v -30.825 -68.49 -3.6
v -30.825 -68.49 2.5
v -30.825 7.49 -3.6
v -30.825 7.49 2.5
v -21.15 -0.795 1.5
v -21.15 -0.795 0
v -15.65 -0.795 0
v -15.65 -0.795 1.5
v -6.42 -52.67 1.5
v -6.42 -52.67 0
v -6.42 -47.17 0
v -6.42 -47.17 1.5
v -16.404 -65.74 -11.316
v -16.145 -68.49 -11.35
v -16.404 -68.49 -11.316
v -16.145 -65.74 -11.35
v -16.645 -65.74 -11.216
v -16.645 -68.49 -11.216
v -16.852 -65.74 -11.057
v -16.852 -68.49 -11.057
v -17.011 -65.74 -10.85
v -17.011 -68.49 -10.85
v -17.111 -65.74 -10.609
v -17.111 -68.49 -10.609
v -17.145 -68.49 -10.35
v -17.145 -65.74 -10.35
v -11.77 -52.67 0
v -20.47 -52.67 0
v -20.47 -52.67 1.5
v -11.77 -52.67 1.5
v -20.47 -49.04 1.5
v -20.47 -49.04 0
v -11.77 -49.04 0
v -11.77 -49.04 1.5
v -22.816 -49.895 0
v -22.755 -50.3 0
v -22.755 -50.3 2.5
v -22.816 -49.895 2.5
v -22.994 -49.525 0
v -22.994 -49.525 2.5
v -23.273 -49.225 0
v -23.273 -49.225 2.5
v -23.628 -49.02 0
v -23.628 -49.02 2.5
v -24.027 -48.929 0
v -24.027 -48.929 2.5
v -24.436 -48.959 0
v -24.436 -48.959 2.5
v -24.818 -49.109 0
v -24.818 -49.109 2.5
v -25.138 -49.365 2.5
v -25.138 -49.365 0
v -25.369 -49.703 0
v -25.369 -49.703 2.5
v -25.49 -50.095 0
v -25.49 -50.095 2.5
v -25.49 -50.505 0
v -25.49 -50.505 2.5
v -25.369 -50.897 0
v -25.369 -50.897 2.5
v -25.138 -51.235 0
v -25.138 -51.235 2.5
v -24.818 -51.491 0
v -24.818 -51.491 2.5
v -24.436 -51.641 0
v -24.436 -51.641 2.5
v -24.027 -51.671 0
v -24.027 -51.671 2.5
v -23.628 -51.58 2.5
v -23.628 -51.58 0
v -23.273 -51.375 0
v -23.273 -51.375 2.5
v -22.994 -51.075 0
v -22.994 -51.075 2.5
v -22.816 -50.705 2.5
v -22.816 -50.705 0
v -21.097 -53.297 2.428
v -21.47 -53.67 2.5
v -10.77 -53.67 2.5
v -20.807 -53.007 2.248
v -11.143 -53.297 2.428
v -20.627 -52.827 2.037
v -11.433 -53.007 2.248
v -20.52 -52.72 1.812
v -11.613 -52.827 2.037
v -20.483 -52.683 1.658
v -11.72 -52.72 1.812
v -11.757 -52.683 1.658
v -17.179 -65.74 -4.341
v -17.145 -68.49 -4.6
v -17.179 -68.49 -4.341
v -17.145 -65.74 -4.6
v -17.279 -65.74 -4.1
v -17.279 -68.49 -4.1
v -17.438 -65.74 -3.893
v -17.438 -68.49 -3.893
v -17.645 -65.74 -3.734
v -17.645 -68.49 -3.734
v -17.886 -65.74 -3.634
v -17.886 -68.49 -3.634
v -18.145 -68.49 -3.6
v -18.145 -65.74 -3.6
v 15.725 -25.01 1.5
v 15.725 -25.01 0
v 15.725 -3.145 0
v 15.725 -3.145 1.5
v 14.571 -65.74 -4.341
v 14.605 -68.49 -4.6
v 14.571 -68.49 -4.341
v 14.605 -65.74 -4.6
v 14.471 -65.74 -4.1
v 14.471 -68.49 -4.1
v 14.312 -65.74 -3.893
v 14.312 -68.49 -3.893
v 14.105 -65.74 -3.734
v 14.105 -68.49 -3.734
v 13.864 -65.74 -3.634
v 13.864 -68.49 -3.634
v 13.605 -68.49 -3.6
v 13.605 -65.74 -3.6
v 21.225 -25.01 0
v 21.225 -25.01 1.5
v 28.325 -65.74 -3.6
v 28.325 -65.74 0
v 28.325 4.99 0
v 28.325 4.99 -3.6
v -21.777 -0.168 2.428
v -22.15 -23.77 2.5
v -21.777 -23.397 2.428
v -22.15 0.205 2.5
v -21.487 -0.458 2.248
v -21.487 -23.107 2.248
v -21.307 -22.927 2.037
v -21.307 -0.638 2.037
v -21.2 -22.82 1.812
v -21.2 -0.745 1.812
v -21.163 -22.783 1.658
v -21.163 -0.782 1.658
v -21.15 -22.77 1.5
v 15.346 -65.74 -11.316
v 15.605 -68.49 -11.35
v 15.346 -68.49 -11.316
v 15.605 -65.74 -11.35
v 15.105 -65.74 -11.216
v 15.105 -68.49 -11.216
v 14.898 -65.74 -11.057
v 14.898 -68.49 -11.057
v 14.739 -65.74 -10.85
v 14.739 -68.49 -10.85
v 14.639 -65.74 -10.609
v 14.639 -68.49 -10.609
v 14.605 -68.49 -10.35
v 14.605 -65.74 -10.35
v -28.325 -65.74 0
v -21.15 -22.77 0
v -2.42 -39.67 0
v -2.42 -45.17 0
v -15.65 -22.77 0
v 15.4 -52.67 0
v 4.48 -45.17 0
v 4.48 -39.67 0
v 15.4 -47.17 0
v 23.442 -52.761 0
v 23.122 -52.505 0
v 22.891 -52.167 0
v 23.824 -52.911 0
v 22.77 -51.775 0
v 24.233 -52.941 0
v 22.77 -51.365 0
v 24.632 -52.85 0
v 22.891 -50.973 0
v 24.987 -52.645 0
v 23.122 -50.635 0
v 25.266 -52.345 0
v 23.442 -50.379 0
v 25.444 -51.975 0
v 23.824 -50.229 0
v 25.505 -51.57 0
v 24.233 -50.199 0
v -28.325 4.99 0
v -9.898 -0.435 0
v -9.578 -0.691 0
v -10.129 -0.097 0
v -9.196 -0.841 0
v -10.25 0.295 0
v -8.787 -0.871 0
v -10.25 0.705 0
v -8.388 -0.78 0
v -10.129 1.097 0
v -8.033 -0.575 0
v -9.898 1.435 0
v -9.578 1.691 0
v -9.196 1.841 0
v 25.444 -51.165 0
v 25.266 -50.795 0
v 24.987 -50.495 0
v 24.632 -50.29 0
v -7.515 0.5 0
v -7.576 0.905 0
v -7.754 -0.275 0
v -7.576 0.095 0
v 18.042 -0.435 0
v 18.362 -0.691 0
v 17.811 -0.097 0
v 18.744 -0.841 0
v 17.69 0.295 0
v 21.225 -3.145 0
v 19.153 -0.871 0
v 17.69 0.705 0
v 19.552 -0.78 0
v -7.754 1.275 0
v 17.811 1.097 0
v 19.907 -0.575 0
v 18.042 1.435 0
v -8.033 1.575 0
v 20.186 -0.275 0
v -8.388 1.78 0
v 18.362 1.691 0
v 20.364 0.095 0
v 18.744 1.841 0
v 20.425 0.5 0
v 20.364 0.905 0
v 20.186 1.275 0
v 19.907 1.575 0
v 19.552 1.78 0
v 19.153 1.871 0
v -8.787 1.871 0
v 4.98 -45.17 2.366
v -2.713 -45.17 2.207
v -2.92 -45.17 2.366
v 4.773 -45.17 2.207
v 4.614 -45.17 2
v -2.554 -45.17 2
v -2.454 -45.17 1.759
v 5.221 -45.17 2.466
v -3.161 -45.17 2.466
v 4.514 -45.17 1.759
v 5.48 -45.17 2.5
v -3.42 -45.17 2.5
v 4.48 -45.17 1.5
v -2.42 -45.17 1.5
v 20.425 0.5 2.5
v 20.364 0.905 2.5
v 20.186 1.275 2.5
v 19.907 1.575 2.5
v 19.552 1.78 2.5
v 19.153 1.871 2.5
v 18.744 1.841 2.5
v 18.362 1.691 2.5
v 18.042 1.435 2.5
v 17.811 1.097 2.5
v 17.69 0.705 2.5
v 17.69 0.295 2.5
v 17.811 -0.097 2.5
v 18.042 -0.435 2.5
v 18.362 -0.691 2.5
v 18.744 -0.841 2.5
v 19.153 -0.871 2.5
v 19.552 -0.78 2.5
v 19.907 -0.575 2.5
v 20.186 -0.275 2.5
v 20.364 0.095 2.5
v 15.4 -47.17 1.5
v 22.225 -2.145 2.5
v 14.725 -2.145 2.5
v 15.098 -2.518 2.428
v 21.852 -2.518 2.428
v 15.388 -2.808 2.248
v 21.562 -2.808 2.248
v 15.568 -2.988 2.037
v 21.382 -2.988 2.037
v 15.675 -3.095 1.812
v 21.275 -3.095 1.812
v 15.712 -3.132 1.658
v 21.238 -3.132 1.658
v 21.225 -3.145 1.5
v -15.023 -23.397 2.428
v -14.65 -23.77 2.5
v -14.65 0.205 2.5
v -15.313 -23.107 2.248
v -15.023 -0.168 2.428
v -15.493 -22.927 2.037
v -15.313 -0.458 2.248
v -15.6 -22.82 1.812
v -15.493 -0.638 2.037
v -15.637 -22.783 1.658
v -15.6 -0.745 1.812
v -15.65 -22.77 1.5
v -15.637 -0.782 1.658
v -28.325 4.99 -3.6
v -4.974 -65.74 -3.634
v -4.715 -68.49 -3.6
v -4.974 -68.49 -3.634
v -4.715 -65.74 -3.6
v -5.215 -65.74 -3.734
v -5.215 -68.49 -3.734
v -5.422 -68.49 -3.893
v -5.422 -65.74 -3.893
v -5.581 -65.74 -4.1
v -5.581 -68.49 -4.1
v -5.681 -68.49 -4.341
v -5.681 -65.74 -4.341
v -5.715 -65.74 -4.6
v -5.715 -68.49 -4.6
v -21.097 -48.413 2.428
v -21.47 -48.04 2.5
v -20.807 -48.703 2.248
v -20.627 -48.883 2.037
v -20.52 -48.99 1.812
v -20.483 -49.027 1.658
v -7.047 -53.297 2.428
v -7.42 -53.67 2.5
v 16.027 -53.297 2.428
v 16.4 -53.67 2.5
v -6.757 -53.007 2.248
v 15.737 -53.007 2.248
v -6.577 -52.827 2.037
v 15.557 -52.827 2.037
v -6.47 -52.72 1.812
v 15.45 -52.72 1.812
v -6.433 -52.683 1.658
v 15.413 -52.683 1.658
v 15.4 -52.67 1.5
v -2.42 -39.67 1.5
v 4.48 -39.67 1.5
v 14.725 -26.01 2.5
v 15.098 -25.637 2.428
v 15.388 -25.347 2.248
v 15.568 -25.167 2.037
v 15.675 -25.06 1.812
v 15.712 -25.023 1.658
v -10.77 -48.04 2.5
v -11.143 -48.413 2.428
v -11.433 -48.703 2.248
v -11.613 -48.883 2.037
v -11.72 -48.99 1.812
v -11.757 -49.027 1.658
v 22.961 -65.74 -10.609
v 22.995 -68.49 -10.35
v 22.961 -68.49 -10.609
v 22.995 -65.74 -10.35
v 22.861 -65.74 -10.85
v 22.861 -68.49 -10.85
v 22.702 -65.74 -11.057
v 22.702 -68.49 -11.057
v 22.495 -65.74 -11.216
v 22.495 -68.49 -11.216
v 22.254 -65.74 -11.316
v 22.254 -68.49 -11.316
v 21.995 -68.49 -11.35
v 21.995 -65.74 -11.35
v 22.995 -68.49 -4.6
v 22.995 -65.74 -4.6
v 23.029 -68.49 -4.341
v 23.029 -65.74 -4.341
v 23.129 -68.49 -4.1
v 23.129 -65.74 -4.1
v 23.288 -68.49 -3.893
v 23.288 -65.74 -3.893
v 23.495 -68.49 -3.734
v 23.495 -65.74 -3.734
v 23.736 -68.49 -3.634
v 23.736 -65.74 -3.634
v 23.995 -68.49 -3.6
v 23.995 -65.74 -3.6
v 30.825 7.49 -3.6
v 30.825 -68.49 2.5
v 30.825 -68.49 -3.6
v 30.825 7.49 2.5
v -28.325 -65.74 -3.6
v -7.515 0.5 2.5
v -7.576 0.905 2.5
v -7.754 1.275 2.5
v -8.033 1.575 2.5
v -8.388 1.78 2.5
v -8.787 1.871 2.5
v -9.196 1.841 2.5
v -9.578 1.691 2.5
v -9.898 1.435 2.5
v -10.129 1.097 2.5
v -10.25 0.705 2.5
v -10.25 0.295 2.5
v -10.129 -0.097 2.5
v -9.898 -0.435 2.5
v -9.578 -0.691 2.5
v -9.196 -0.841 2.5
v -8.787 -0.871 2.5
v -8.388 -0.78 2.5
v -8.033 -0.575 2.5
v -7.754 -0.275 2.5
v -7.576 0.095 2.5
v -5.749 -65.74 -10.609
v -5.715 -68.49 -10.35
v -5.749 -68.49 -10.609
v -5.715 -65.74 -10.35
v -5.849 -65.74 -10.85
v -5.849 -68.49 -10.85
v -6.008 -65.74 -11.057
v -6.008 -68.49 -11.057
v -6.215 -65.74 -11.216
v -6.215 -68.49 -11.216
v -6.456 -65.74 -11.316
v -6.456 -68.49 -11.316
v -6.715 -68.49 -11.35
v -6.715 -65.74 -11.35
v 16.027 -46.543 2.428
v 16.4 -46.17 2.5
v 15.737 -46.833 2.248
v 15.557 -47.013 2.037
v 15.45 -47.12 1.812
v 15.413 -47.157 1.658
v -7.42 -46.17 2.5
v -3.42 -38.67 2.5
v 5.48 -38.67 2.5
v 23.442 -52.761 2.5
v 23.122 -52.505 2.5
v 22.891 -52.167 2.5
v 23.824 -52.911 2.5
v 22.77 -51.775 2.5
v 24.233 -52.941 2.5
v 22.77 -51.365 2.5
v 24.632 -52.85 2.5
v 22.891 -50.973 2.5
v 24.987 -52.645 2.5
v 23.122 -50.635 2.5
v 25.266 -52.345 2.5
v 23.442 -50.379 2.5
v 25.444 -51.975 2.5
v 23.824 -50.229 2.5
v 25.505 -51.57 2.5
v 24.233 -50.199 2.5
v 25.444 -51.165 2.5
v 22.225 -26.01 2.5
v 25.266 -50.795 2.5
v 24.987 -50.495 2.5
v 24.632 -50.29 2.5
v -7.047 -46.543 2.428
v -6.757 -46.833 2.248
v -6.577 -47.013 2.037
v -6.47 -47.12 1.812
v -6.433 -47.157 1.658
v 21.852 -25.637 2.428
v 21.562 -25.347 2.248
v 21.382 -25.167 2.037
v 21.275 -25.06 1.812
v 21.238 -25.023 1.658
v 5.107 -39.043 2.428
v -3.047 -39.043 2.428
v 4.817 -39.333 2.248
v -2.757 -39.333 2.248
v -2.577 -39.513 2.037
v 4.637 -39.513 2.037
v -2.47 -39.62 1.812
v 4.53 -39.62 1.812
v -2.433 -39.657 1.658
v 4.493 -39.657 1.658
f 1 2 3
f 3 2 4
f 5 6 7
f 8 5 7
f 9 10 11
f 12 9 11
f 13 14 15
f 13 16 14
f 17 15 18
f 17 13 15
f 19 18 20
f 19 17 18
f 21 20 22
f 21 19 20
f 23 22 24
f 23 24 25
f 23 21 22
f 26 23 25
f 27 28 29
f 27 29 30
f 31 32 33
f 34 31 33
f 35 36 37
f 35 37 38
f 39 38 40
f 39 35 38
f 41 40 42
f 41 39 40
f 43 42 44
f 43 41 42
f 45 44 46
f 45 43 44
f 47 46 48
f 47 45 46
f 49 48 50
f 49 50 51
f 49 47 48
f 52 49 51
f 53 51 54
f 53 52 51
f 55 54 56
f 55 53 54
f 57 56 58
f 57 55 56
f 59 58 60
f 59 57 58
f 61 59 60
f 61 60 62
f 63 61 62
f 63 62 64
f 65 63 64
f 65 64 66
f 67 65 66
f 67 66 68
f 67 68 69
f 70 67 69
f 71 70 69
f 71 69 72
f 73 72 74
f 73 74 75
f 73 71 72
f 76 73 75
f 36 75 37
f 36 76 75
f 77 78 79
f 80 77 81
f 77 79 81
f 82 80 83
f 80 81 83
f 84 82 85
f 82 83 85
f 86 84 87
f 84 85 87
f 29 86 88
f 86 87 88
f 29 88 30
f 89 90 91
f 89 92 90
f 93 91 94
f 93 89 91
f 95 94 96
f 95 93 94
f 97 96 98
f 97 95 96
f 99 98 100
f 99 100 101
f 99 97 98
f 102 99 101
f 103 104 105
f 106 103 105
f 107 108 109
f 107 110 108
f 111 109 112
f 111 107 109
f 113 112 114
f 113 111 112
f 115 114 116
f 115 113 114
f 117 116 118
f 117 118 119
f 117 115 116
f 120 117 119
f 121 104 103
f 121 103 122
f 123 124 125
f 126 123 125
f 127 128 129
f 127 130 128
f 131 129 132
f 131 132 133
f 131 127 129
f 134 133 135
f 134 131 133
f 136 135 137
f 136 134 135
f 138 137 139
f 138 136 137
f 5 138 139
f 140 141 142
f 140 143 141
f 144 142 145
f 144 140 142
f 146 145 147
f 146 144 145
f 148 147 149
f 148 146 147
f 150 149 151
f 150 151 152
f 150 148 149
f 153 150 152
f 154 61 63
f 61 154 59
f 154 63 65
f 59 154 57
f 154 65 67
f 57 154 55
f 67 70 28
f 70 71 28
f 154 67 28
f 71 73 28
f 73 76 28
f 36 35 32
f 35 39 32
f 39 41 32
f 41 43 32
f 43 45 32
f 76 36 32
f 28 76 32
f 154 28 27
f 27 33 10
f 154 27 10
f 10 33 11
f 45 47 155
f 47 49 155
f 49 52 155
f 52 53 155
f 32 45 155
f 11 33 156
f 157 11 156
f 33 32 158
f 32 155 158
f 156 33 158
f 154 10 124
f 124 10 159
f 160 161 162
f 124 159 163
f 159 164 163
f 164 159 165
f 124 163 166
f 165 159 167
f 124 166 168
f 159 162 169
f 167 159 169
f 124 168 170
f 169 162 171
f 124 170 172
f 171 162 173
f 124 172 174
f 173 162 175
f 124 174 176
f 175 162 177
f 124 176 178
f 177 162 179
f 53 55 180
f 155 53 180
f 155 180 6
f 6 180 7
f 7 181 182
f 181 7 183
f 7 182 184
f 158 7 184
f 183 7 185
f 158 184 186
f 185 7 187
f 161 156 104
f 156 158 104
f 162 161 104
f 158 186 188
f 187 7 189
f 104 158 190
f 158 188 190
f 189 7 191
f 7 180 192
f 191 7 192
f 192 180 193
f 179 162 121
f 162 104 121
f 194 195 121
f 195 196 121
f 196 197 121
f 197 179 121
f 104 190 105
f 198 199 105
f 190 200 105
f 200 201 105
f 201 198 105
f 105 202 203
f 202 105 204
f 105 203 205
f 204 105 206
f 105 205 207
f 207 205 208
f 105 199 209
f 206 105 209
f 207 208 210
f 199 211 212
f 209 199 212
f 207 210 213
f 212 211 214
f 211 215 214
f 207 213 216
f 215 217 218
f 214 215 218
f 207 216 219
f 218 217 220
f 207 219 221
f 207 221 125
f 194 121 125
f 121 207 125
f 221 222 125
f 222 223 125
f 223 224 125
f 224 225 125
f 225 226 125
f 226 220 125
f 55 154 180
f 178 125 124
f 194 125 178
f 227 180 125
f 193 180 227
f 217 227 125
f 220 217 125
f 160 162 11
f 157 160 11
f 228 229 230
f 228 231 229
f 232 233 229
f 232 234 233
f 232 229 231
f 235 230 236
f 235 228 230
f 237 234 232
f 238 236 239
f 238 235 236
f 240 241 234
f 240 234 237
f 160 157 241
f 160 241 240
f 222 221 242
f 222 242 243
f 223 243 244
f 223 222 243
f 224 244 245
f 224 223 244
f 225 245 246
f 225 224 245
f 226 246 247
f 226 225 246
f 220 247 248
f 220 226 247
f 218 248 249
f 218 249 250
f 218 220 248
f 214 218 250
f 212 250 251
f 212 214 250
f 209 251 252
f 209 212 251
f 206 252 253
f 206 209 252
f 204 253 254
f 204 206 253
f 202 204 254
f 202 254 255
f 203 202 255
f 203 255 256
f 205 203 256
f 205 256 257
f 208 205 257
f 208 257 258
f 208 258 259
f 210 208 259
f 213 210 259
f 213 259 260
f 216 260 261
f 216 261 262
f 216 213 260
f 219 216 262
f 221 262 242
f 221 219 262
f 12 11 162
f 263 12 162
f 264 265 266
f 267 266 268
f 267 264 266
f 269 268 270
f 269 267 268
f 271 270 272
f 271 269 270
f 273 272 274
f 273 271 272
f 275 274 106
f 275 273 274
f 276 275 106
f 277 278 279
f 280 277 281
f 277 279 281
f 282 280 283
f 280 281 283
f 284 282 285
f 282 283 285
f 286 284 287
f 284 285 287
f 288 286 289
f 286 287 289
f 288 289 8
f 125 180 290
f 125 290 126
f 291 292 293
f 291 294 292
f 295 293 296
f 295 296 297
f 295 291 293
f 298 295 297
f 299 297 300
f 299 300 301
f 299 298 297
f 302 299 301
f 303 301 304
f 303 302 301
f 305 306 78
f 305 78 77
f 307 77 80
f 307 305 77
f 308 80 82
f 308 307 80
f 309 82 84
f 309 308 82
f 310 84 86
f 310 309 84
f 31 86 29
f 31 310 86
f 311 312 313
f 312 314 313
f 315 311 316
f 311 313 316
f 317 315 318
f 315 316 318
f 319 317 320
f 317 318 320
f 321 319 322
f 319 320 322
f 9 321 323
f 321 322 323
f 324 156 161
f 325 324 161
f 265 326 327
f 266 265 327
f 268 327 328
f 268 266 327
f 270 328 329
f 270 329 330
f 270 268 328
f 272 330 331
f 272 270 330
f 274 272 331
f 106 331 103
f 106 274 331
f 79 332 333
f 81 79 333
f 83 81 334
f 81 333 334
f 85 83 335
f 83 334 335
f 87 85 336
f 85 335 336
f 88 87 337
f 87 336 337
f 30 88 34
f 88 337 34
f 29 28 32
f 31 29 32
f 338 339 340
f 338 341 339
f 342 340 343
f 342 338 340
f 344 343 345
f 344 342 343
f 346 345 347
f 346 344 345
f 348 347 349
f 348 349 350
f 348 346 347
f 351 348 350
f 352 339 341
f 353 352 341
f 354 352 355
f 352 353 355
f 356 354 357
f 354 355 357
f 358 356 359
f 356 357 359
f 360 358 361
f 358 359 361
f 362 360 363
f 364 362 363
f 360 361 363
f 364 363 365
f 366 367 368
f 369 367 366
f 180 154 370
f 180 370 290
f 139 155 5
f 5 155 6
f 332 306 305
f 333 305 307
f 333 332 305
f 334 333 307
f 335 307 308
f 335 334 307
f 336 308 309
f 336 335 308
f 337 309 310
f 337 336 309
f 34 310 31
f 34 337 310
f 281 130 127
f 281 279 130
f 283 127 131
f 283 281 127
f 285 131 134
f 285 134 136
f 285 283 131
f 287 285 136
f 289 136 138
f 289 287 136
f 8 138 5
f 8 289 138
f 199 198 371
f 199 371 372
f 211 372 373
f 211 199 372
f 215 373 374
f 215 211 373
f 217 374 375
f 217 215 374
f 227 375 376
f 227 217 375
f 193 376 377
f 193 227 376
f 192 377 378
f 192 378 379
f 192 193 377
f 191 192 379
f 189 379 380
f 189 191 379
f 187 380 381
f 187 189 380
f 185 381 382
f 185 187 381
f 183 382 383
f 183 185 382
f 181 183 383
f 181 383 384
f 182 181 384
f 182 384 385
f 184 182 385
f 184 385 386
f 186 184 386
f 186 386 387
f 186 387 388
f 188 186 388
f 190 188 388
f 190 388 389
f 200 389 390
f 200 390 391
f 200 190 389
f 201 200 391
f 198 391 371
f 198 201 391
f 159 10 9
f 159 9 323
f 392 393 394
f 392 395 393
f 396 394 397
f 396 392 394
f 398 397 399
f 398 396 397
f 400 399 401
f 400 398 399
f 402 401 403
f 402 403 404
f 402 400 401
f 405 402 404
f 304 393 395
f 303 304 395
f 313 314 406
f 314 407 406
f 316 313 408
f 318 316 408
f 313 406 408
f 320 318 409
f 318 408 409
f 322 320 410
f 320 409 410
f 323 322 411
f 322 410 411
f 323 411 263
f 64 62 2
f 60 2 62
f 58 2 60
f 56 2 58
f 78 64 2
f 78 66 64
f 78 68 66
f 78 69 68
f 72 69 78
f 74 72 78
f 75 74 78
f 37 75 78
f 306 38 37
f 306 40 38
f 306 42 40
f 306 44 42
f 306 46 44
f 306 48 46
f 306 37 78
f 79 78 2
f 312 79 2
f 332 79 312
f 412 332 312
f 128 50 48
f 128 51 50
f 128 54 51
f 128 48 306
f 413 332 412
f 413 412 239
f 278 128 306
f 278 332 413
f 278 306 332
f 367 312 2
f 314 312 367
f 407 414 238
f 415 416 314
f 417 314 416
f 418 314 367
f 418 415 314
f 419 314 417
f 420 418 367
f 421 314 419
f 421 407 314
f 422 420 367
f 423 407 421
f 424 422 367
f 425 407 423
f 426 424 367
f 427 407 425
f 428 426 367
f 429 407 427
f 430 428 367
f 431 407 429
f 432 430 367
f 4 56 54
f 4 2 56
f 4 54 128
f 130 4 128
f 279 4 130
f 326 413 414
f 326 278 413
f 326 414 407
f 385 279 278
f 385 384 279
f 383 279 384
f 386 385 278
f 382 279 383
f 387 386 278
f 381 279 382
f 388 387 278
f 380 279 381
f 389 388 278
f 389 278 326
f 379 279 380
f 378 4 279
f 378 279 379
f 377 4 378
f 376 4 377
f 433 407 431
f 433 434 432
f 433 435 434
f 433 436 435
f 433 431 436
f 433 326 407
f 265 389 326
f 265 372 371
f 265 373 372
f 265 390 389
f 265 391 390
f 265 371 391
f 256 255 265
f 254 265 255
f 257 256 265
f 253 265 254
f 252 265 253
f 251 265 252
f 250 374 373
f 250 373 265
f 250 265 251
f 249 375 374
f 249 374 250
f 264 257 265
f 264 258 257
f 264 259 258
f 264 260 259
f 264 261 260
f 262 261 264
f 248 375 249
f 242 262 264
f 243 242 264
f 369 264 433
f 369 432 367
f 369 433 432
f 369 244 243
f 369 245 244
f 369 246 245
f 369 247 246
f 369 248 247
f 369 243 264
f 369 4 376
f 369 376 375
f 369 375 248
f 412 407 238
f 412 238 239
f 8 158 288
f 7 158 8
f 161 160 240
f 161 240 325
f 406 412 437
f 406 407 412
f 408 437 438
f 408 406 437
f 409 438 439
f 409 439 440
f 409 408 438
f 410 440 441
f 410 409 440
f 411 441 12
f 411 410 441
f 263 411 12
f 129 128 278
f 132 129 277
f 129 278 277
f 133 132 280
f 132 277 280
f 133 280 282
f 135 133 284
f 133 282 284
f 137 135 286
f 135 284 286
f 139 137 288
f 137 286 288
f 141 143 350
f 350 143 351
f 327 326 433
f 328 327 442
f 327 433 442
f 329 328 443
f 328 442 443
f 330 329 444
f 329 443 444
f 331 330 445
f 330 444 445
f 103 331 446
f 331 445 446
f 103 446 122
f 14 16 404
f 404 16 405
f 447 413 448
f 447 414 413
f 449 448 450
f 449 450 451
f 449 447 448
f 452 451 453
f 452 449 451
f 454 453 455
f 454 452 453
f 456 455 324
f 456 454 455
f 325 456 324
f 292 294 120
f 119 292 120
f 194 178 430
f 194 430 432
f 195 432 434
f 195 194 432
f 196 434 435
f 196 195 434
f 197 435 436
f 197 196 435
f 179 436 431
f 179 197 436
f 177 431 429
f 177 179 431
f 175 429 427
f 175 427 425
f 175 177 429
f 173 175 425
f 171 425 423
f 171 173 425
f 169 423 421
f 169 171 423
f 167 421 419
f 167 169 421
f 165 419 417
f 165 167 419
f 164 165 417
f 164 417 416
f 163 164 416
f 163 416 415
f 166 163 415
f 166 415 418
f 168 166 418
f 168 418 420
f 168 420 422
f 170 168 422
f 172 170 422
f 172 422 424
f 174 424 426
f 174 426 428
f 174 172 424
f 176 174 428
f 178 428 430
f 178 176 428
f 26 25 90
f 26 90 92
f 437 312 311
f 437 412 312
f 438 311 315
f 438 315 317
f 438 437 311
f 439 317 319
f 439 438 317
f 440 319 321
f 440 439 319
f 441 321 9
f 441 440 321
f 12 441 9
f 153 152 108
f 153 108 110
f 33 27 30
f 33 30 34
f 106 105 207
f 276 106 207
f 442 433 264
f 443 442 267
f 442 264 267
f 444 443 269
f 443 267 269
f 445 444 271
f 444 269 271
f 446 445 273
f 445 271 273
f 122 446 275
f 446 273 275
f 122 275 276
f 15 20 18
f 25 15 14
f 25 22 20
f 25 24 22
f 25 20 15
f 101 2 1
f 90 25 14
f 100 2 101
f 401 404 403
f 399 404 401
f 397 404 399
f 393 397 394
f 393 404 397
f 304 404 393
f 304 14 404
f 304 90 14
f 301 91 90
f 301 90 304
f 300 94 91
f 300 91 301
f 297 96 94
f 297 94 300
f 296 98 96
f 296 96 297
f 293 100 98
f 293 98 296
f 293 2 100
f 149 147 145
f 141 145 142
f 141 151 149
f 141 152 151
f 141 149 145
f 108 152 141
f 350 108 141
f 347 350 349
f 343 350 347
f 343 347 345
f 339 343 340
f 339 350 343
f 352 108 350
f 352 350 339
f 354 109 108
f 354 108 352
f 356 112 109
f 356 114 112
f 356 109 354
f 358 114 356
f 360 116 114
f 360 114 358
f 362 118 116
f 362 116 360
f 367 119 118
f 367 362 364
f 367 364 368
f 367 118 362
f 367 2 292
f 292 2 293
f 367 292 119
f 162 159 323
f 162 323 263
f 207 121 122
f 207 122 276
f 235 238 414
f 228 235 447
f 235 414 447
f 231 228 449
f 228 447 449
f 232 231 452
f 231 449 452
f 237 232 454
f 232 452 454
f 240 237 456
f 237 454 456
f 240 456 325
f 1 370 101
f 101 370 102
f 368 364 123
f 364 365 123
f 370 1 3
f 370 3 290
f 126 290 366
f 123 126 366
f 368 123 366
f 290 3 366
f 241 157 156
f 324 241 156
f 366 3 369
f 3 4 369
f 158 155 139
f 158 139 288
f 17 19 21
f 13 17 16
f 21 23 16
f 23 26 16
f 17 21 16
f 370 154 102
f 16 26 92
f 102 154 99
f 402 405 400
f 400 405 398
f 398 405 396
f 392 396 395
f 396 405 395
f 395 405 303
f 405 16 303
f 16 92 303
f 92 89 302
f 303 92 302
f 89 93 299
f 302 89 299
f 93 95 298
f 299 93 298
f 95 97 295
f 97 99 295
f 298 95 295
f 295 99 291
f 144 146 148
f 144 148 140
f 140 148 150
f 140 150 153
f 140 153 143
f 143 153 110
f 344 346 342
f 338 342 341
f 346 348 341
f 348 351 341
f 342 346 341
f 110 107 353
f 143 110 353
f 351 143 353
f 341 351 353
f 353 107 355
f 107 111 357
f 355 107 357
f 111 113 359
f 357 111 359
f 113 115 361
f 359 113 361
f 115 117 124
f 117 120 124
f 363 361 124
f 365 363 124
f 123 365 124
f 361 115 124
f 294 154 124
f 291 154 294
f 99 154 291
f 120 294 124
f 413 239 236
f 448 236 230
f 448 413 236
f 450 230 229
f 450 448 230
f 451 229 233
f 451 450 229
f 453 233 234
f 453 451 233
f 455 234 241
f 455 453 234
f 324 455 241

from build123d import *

# Parameters (mm, degrees)
SKETCH018_W   = 61.65
SKETCH018_H   = 75.98
SKETCH018_R   = 1.375
SKETCH018_W_2 = 21.82
SKETCH018_H_2 = 5.5
SKETCH018_W_3 = 8.7
SKETCH018_H_3 = 3.63
SKETCH018_W_4 = 6.9
SKETCH018_W_5 = 5.5
SKETCH018_H_4 = 21.975
SKETCH018_H_5 = 21.865
PAD011_DEPTH  = 2.5
SKETCH019_W   = 61.65
SKETCH019_H   = 75.98
SKETCH019_W_2 = 56.65
SKETCH019_H_2 = 70.73
PAD012_DEPTH  = 3.6
SKETCH020_W   = 11.43
SKETCH020_H   = 2.75
SKETCH020_W_2 = 8.39
PAD013_DEPTH  = 11.35
FILLET005_R   = 1


with BuildPart() as part:
    # Sketch018 → Pad011 (new body)
    with BuildSketch(Plane.XY):
        with Locations((0, -30.5)):
            Rectangle(SKETCH018_W, SKETCH018_H)
        with Locations((-8.89, 0.5)):
            Circle(SKETCH018_R, mode=Mode.SUBTRACT)
        with Locations((19.05, 0.5)):
            Circle(SKETCH018_R, mode=Mode.SUBTRACT)
        with Locations((-24.13, -50.3)):
            Circle(SKETCH018_R, mode=Mode.SUBTRACT)
        with Locations((24.13, -51.57)):
            Circle(SKETCH018_R, mode=Mode.SUBTRACT)
        with Locations((4.49, -49.92)):
            Rectangle(SKETCH018_W_2, SKETCH018_H_2, mode=Mode.SUBTRACT)
        with Locations((-16.12, -50.855)):
            Rectangle(SKETCH018_W_3, SKETCH018_H_3, mode=Mode.SUBTRACT)
        with Locations((1.03, -42.42)):
            Rectangle(SKETCH018_W_4, SKETCH018_H_2, mode=Mode.SUBTRACT)
        with Locations((-18.4, -11.7825)):
            Rectangle(SKETCH018_W_5, SKETCH018_H_4, mode=Mode.SUBTRACT)
        with Locations((18.475, -14.0775)):
            Rectangle(SKETCH018_W_5, SKETCH018_H_5, mode=Mode.SUBTRACT)
    extrude(amount=PAD011_DEPTH)

    # Sketch019 → Pad012 (join)
    with BuildSketch(Plane.XY):
        with Locations((0, -30.5)):
            Rectangle(SKETCH019_W, SKETCH019_H)
        with Locations((0, -30.375)):
            Rectangle(SKETCH019_W_2, SKETCH019_H_2, mode=Mode.SUBTRACT)
    extrude(amount=-PAD012_DEPTH)

    # Sketch020 → Pad013 (join)
    with BuildSketch(Plane.XY):
        with Locations((-11.43, -67.115)):
            Rectangle(SKETCH020_W, SKETCH020_H)
        with Locations((18.8, -67.115)):
            Rectangle(SKETCH020_W_2, SKETCH020_H)
    extrude(amount=-PAD013_DEPTH)

    # Fillet005
    fillet005_edges = [part.edges().sort_by_distance(p)[0] for p in [
        (-20.47, -50.855, 2.5),
        (-16.12, -49.04, 2.5),
        (-16.12, -52.67, 2.5),
        (-11.77, -50.855, 2.5),
        (-6.42, -49.92, 2.5),
        (4.49, -47.17, 2.5),
        (4.49, -52.67, 2.5),
        (15.4, -49.92, 2.5),
        (-2.42, -42.42, 2.5),
        (1.03, -39.67, 2.5),
        (4.48, -42.42, 2.5),
        (18.475, -3.145, 2.5),
        (21.225, -14.0775, 2.5),
        (15.725, -14.0775, 2.5),
        (18.475, -25.01, 2.5),
        (-18.4, -0.795, 2.5),
        (-15.65, -11.7825, 2.5),
        (-21.15, -11.7825, 2.5),
        (-18.4, -22.77, 2.5),
        (-17.145, -67.115, -3.6),
        (-17.145, -67.115, -11.35),
        (-5.715, -67.115, -11.35),
        (14.605, -67.115, -3.6),
        (14.605, -67.115, -11.35),
        (22.995, -67.115, -11.35),
        (-5.715, -67.115, -3.6),
        (22.995, -67.115, -3.6),
    ]]
    fillet(fillet005_edges, radius=FILLET005_R)


solid = part.part
